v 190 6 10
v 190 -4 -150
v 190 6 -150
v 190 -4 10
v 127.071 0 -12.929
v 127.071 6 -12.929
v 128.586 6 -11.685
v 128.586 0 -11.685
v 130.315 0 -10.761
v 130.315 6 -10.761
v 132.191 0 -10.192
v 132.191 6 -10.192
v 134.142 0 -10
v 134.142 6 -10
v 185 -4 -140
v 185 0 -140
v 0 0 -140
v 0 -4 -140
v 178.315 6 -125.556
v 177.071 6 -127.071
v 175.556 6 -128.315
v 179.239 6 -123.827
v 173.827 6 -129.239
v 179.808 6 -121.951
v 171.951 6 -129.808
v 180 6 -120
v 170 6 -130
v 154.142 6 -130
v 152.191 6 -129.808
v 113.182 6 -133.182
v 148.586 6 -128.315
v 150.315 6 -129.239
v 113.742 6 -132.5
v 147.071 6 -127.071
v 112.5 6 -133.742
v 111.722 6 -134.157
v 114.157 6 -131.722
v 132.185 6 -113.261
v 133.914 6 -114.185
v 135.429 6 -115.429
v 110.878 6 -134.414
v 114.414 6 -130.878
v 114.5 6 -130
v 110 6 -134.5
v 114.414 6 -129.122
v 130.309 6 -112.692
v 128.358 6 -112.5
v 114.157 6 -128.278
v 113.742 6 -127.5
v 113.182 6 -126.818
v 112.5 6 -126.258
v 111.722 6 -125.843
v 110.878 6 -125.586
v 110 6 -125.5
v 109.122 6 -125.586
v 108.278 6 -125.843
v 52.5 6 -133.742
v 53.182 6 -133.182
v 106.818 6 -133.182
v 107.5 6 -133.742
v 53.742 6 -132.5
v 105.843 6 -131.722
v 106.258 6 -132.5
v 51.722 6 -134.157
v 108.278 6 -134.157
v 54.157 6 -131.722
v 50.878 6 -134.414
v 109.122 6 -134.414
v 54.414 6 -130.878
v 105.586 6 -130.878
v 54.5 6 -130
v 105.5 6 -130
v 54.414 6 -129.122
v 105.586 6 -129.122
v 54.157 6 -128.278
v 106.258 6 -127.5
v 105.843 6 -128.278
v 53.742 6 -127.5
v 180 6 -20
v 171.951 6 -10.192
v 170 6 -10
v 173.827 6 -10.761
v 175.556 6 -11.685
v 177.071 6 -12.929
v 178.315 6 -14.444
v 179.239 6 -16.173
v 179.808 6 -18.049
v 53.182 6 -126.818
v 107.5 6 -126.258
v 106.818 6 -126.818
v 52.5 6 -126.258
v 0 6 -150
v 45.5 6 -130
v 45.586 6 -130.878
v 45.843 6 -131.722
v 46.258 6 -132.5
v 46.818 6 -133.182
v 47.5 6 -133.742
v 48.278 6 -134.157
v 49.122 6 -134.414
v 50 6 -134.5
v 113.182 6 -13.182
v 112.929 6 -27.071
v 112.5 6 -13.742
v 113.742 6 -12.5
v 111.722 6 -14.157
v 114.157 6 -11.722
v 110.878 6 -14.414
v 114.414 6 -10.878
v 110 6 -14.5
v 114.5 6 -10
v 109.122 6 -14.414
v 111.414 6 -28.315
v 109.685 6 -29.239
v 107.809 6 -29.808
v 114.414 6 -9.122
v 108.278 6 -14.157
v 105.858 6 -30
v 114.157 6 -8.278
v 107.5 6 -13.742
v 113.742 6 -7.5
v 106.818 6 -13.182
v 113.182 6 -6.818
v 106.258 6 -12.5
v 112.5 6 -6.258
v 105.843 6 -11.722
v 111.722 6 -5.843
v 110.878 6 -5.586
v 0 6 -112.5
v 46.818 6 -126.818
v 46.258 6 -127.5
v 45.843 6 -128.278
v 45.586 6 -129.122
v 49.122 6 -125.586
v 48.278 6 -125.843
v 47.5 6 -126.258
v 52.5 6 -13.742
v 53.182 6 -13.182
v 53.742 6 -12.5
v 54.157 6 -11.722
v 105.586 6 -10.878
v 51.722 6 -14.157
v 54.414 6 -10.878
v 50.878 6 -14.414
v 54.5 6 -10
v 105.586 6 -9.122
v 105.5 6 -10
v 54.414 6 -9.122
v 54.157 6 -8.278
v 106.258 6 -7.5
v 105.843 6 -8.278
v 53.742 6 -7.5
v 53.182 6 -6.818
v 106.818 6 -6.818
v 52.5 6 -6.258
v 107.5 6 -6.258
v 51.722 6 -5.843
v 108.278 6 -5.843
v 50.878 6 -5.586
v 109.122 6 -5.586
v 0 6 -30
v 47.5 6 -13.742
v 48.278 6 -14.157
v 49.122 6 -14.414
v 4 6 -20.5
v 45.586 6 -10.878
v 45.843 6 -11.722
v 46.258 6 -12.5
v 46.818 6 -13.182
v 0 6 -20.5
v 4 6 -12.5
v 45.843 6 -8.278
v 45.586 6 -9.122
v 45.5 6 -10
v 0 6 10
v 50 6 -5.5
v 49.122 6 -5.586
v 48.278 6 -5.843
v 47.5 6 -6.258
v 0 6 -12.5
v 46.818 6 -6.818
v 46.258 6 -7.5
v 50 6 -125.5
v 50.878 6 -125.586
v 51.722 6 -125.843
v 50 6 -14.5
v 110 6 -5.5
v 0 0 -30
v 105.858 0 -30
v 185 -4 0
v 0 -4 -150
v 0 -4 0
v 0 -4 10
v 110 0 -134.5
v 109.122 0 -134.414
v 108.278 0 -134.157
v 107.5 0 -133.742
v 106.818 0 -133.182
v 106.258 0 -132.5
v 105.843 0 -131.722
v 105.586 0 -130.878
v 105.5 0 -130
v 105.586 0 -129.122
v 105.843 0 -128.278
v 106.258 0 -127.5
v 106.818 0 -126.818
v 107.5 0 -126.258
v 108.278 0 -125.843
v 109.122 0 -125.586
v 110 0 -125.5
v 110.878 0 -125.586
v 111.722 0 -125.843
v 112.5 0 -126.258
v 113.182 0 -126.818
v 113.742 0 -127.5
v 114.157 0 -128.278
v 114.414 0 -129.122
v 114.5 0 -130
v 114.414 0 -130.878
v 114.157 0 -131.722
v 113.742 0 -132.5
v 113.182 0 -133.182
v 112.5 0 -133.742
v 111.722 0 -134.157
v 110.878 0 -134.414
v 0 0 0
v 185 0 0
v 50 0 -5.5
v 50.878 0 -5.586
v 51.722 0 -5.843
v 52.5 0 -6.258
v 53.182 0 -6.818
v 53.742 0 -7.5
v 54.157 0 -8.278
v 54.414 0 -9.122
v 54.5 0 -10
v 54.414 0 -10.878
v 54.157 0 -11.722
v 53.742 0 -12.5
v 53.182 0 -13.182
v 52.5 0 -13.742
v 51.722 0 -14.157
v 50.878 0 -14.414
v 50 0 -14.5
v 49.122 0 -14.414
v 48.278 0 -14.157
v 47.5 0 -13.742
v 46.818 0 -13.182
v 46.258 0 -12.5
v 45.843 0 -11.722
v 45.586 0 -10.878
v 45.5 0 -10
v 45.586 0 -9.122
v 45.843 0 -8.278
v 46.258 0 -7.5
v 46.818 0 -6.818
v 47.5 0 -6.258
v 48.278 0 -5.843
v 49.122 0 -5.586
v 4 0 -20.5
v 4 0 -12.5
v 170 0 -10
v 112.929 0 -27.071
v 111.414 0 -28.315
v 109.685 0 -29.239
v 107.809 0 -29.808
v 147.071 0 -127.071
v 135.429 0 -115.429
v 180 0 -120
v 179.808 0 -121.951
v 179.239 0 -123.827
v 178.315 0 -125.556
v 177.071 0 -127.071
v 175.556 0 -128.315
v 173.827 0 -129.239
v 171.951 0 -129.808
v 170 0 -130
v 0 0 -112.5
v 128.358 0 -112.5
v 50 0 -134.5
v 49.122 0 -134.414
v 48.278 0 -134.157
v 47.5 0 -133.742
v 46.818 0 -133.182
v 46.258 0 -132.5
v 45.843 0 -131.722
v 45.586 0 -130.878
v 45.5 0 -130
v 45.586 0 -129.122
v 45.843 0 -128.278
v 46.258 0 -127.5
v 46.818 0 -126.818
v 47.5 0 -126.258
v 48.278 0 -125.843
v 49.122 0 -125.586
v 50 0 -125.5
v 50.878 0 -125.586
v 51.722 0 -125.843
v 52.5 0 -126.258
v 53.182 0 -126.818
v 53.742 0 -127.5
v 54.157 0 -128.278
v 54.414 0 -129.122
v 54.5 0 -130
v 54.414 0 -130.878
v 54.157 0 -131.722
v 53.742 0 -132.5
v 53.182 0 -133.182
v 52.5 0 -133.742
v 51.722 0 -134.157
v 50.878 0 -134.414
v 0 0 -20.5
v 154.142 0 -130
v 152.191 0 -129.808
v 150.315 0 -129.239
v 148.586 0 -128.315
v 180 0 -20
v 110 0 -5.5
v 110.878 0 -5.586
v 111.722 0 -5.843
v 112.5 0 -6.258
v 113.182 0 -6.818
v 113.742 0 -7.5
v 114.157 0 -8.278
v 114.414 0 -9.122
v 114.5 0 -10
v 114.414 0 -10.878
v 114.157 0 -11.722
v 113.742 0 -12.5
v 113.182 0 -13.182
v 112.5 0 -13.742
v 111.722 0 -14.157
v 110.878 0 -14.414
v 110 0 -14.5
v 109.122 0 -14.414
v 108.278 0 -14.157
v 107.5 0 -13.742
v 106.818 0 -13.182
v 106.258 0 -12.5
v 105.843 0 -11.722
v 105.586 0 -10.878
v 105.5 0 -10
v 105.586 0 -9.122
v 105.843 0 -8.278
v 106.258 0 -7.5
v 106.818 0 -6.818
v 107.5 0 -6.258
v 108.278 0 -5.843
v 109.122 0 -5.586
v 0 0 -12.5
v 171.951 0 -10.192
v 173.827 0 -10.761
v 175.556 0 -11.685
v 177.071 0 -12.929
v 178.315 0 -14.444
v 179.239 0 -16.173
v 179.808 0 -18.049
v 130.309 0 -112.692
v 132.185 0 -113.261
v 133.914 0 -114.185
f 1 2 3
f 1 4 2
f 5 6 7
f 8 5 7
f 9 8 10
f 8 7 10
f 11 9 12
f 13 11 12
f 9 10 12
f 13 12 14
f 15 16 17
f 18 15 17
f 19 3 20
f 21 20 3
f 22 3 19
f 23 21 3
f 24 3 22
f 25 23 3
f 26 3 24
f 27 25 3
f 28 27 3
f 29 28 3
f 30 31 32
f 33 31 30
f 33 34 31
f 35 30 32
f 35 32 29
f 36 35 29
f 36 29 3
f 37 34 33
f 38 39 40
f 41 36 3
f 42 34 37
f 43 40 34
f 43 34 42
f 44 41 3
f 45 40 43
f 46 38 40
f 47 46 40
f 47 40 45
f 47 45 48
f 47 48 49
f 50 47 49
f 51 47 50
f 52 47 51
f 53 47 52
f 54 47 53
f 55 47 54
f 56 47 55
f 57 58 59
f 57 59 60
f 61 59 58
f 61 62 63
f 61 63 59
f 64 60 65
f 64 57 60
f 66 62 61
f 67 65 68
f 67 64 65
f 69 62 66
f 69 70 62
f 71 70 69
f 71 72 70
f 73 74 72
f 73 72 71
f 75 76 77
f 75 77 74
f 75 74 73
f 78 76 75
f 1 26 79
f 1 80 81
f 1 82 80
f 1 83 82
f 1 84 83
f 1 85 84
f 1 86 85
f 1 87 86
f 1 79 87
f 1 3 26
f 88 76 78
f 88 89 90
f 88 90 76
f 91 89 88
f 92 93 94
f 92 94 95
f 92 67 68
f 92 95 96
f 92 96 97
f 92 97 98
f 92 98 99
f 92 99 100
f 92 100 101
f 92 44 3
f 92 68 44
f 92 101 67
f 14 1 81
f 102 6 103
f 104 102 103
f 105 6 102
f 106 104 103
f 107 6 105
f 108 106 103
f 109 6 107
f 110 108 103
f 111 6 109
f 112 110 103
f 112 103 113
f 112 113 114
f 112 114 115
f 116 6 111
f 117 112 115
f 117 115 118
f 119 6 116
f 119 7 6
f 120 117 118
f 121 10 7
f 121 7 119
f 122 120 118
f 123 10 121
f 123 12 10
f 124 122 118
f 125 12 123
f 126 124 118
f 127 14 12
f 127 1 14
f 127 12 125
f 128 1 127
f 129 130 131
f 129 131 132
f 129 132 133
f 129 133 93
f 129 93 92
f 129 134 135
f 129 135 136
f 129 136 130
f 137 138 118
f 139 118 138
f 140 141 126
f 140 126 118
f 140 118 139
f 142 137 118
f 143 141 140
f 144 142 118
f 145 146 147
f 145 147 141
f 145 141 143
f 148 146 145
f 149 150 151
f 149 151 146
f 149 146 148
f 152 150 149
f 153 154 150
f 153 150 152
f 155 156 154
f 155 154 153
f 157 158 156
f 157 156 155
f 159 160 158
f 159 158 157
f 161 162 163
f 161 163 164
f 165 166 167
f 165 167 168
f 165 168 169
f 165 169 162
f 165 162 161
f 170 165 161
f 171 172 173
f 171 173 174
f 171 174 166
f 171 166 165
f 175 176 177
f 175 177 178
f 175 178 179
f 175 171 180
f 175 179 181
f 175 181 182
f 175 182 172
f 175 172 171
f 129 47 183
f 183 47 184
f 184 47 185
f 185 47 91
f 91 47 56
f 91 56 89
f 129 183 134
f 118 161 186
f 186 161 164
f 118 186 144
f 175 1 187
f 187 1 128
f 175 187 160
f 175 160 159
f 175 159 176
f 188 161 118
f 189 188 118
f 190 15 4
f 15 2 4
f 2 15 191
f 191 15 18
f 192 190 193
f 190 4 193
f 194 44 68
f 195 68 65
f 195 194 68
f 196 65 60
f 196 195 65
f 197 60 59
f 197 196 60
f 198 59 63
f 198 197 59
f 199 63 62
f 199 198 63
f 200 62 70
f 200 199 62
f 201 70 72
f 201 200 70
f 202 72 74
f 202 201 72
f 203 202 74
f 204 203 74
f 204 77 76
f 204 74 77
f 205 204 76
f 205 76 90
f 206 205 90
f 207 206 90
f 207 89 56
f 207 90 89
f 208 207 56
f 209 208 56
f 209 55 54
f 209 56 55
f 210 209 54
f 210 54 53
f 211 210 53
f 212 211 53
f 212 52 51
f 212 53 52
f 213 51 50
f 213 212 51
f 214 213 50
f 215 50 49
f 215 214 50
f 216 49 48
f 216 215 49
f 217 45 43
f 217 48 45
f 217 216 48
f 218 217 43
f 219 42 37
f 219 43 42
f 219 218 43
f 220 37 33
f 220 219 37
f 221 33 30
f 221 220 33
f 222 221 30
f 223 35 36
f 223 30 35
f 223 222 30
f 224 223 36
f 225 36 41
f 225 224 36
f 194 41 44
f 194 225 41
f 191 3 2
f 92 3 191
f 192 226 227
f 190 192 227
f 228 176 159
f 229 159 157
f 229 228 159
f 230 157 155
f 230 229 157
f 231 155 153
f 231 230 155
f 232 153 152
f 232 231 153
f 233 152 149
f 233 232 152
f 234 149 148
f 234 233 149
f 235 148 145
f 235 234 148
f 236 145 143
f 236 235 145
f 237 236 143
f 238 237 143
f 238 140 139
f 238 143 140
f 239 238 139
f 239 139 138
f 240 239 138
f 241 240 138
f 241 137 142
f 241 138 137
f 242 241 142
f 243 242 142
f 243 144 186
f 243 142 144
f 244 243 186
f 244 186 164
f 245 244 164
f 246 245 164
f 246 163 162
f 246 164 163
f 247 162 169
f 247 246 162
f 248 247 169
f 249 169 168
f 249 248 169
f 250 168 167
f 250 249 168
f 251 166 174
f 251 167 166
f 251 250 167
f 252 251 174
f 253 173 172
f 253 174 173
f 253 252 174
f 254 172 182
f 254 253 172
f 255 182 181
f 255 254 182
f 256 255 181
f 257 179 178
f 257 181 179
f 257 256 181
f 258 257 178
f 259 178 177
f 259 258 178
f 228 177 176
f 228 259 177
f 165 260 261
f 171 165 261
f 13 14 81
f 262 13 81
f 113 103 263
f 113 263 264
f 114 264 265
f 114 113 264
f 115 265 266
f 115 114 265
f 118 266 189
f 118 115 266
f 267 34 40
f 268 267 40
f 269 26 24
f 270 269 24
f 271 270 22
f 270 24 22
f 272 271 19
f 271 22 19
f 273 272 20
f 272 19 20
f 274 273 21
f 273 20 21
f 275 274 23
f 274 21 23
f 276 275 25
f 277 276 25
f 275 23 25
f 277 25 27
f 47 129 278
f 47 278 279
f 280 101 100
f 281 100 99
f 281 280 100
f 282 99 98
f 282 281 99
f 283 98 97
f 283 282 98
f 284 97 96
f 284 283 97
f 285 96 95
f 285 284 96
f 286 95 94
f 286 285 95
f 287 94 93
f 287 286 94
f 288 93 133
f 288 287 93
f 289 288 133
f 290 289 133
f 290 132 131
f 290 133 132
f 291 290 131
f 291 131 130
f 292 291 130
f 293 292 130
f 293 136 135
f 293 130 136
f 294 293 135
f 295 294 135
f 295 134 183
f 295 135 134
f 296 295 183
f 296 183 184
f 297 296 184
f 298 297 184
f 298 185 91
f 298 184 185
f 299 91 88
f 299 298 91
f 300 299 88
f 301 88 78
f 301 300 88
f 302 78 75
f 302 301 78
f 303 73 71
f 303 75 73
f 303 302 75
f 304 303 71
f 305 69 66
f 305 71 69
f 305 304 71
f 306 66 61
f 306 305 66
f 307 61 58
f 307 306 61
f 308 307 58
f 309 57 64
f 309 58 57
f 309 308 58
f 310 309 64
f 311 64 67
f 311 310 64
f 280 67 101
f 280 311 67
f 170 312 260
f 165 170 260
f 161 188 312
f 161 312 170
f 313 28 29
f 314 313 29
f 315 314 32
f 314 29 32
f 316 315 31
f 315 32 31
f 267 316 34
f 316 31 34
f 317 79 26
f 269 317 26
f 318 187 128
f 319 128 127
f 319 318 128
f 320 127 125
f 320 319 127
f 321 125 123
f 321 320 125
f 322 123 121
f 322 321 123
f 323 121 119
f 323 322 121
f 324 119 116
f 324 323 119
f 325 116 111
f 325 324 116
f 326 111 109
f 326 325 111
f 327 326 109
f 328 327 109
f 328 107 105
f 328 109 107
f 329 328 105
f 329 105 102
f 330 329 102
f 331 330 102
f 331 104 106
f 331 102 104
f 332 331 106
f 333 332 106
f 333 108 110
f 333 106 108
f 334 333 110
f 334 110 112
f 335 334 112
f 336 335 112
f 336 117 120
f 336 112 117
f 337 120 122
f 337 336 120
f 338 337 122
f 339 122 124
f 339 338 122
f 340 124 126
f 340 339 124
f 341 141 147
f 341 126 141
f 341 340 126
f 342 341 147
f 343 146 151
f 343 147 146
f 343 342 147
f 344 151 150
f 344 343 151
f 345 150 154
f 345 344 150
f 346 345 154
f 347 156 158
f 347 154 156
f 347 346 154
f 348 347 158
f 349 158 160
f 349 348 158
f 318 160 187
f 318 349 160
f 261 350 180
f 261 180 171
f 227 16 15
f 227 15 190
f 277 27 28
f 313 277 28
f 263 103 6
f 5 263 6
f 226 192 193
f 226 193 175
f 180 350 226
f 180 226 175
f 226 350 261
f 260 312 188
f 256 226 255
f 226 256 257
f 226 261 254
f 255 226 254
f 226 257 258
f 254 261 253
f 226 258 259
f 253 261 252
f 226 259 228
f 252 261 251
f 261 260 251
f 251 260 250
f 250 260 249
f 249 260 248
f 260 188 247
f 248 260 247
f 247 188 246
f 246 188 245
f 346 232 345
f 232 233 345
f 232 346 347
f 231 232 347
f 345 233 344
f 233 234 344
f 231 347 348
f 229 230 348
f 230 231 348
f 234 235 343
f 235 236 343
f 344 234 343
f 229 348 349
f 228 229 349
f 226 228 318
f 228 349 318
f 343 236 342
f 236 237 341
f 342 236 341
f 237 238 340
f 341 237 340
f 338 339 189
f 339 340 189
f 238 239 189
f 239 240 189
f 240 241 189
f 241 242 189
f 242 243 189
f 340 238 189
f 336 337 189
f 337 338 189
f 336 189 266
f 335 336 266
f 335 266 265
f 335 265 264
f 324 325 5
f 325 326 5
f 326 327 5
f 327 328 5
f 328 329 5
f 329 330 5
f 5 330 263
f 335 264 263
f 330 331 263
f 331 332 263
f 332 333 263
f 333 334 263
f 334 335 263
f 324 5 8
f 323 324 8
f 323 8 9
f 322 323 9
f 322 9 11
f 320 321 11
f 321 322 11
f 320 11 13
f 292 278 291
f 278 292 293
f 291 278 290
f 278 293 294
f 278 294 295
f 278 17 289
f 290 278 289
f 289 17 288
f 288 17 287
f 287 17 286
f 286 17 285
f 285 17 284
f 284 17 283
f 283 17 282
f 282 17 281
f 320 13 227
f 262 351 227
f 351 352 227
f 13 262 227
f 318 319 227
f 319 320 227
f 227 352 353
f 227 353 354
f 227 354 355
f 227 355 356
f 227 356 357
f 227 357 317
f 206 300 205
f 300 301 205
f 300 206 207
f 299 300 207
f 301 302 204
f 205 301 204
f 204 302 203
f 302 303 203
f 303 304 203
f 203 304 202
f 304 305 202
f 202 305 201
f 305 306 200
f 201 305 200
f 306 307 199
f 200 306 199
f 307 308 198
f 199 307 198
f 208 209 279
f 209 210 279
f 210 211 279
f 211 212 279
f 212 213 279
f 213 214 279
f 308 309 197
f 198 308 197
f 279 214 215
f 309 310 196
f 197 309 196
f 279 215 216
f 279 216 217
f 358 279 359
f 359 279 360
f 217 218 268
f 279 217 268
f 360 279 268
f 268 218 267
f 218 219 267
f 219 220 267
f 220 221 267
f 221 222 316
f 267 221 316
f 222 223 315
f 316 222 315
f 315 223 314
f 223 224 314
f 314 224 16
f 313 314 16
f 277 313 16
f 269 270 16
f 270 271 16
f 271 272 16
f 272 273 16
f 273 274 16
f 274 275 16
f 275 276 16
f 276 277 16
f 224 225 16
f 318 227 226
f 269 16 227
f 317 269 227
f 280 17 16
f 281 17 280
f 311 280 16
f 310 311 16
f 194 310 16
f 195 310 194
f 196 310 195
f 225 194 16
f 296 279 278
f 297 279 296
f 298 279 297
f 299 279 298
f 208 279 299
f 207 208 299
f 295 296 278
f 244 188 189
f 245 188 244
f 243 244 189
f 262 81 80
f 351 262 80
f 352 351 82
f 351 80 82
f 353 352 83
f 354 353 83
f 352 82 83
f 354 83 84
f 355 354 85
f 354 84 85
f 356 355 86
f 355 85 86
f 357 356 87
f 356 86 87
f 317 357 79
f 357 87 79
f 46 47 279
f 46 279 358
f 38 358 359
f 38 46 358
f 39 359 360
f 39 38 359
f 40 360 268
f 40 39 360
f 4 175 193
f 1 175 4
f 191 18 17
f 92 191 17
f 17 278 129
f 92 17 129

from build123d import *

# Parameters (mm, degrees)
SKETCH1_W           = 190
SKETCH1_H           = 140
BOSS_EXTRUDE1_DEPTH = 6
CUT_EXTRUDE1_DEPTH  = 10
SKETCH4_W           = 5
SKETCH4_H           = 140
BOSS_EXTRUDE4_DEPTH = 4
SKETCH8_W           = 190
SKETCH8_H           = 10
BOSS_EXTRUDE8_DEPTH = 10
SKETCH9_W           = 190
SKETCH9_H           = 10
BOSS_EXTRUDE9_DEPTH = 10
SKETCH10_W          = 4
SKETCH10_H          = 8
CUT_EXTRUDE3_DEPTH  = 10
SKETCH11_R          = 3
CUT_EXTRUDE4_DEPTH  = 10
SKETCH12_R          = 4.5
CUT_EXTRUDE6_DEPTH  = 243.148714636
SKETCH3_W           = 150
SKETCH3_H           = 82.5
CUT_EXTRUDE7_DEPTH  = 10
CUT_EXTRUDE9_DEPTH  = 10


with BuildPart() as part:
    # Sketch1 → Boss-Extrude1 (new body)
    with BuildSketch(Plane(origin=(0, 0, 0), x_dir=(1, 0, 0), z_dir=(0, 1, 0))):
        with Locations((95, 70)):
            Rectangle(SKETCH1_W, SKETCH1_H)
    extrude(amount=BOSS_EXTRUDE1_DEPTH)

    # Sketch2 → Cut-Extrude1 (cut)
    with BuildSketch(Plane(origin=(0, 6, 0), x_dir=(1, 0, 0), z_dir=(0, 1, 0))):
        with BuildLine():
            Line((147.071067812, 127.071067812), (112.928932188, 92.928932188))
            ThreePointArc((112.928932188, 92.928932188), (109.6846987, 90.761204675), (105.857864376, 90))
            Line((105.857864376, 90), (0, 90))
            Line((0, 90), (0, 77.5))
            Line((0, 77.5), (94.092172608, 77.5))
            ThreePointArc((94.092172608, 77.5), (95.939931673, 76.265366865), (95.50638617, 74.085786438))
            Line((95.50638617, 74.085786438), (86.849531921, 65.428932188))
            ThreePointArc((86.849531921, 65.428932188), (83.605298432, 63.261204675), (79.778464109, 62.5))
            Line((79.778464109, 62.5), (30.446951372, 62.5))
            Line((30.446951372, 62.5), (0, 62.5))
            Line((0, 62.5), (0, 47.5))
            Line((0, 47.5), (88.357864376, 47.5))
            ThreePointArc((88.357864376, 47.5), (92.1846987, 46.738795325), (95.428932188, 44.571067812))
            Line((95.428932188, 44.571067812), (127.071067812, 12.928932188))
            ThreePointArc((127.071067812, 12.928932188), (130.3153013, 10.761204675), (134.142135624, 10))
            Line((134.142135624, 10), (170, 10))
            ThreePointArc((170, 10), (177.071067812, 12.928932188), (180, 20))
            Line((180, 20), (180, 120))
            ThreePointArc((180, 120), (177.071067812, 127.071067812), (170, 130))
            Line((170, 130), (154.142135624, 130))
            ThreePointArc((154.142135624, 130), (150.3153013, 129.238795325), (147.071067812, 127.071067812))
        make_face()
        with BuildLine():
            Line((94.092172608, 77.5), (0, 77.5))
            Line((0, 77.5), (0, 62.5))
            Line((0, 62.5), (30.446951372, 62.5))
            Line((30.446951372, 62.5), (79.778464109, 62.5))
            ThreePointArc((79.778464109, 62.5), (83.605298432, 63.261204675), (86.849531921, 65.428932188))
            Line((86.849531921, 65.428932188), (95.50638617, 74.085786438))
            ThreePointArc((95.50638617, 74.085786438), (95.939931673, 76.265366865), (94.092172608, 77.5))
        make_face()
    extrude(amount=-CUT_EXTRUDE1_DEPTH, mode=Mode.SUBTRACT)

    # Sketch4 → Boss-Extrude4 (add)
    with BuildSketch(Plane.XZ):
        with Locations((187.5, -70)):
            Rectangle(SKETCH4_W, SKETCH4_H)
    extrude(amount=BOSS_EXTRUDE4_DEPTH)

    # Sketch8 → Boss-Extrude8 (add)
    with BuildSketch(Plane.XY):
        with Locations((95, 1)):
            Rectangle(SKETCH8_W, SKETCH8_H)
    extrude(amount=BOSS_EXTRUDE8_DEPTH)

    # Sketch9 → Boss-Extrude9 (add)
    with BuildSketch(Plane(origin=(0, 0, -140), x_dir=(-1, 0, 0), z_dir=(0, 0, -1))):
        with Locations((-95, 1)):
            Rectangle(SKETCH9_W, SKETCH9_H)
    extrude(amount=BOSS_EXTRUDE9_DEPTH)

    # Sketch10 → Cut-Extrude3 (cut)
    with BuildSketch(Plane.XZ):
        with Locations((2, -16.5)):
            Rectangle(SKETCH10_W, SKETCH10_H)
    extrude(amount=-CUT_EXTRUDE3_DEPTH, mode=Mode.SUBTRACT)

    # Sketch11 → Cut-Extrude4 (cut)
    with BuildSketch(Plane(origin=(0, 6, 0), x_dir=(1, 0, 0), z_dir=(0, 1, 0))):
        with Locations(Location((50, 10, 0), (0, 0, 270))):
            Circle(SKETCH11_R)
        with Locations(Location((110, 10, 0), (0, 0, 270))):
            Circle(SKETCH11_R)
        with Locations(Location((110, 130, 0), (0, 0, 90))):
            Circle(SKETCH11_R)
        with Locations(Location((50, 130, 0), (0, 0, 90))):
            Circle(SKETCH11_R)
    extrude(amount=-CUT_EXTRUDE4_DEPTH, mode=Mode.SUBTRACT)

    # Sketch12 → Cut-Extrude6 (cut, through all)
    with BuildSketch(Plane(origin=(0, 0, 0), x_dir=(1, 0, 0), z_dir=(0, 1, 0))):
        with Locations(Location((50, 10, 0), (0, 0, 270))):
            Circle(SKETCH12_R)
        with Locations(Location((110, 10, 0), (0, 0, 270))):
            Circle(SKETCH12_R)
        with Locations(Location((110, 130, 0), (0, 0, 90))):
            Circle(SKETCH12_R)
        with Locations(Location((50, 130, 0), (0, 0, 90))):
            Circle(SKETCH12_R)
    extrude(amount=CUT_EXTRUDE6_DEPTH, mode=Mode.SUBTRACT)

    # Sketch3 → Cut-Extrude7 (cut)
    with BuildSketch(Plane(origin=(0, 6, 0), x_dir=(1, 0, 0), z_dir=(0, 1, 0))):
        with Locations((75, 71.25)):
            Rectangle(SKETCH3_W, SKETCH3_H)
    extrude(amount=-CUT_EXTRUDE7_DEPTH, mode=Mode.SUBTRACT)

    # Sketch14 → Cut-Extrude9 (cut)
    with BuildSketch(Plane(origin=(0, 6, 0), x_dir=(1, 0, 0), z_dir=(0, 1, 0))):
        with BuildLine():
            Line((127.071067812, 12.928932188), (112.928932188, 27.071067812))
            ThreePointArc((112.928932188, 27.071067812), (109.6846987, 29.238795325), (105.857864376, 30))
            Line((105.857864376, 30), (0, 30))
            Line((0, 30), (0, 112.5))
            Line((0, 112.5), (128.357864376, 112.5))
            ThreePointArc((128.357864376, 112.5), (132.1846987, 113.261204675), (135.428932188, 115.428932188))
            Line((135.428932188, 115.428932188), (147.071067812, 127.071067812))
            Line((147.071067812, 127.071067812), (147.071067812, 92.661701481))
            Line((147.071067812, 92.661701481), (127.071067812, 12.928932188))
        make_face()
    extrude(amount=-CUT_EXTRUDE9_DEPTH, mode=Mode.SUBTRACT)


solid = part.part
